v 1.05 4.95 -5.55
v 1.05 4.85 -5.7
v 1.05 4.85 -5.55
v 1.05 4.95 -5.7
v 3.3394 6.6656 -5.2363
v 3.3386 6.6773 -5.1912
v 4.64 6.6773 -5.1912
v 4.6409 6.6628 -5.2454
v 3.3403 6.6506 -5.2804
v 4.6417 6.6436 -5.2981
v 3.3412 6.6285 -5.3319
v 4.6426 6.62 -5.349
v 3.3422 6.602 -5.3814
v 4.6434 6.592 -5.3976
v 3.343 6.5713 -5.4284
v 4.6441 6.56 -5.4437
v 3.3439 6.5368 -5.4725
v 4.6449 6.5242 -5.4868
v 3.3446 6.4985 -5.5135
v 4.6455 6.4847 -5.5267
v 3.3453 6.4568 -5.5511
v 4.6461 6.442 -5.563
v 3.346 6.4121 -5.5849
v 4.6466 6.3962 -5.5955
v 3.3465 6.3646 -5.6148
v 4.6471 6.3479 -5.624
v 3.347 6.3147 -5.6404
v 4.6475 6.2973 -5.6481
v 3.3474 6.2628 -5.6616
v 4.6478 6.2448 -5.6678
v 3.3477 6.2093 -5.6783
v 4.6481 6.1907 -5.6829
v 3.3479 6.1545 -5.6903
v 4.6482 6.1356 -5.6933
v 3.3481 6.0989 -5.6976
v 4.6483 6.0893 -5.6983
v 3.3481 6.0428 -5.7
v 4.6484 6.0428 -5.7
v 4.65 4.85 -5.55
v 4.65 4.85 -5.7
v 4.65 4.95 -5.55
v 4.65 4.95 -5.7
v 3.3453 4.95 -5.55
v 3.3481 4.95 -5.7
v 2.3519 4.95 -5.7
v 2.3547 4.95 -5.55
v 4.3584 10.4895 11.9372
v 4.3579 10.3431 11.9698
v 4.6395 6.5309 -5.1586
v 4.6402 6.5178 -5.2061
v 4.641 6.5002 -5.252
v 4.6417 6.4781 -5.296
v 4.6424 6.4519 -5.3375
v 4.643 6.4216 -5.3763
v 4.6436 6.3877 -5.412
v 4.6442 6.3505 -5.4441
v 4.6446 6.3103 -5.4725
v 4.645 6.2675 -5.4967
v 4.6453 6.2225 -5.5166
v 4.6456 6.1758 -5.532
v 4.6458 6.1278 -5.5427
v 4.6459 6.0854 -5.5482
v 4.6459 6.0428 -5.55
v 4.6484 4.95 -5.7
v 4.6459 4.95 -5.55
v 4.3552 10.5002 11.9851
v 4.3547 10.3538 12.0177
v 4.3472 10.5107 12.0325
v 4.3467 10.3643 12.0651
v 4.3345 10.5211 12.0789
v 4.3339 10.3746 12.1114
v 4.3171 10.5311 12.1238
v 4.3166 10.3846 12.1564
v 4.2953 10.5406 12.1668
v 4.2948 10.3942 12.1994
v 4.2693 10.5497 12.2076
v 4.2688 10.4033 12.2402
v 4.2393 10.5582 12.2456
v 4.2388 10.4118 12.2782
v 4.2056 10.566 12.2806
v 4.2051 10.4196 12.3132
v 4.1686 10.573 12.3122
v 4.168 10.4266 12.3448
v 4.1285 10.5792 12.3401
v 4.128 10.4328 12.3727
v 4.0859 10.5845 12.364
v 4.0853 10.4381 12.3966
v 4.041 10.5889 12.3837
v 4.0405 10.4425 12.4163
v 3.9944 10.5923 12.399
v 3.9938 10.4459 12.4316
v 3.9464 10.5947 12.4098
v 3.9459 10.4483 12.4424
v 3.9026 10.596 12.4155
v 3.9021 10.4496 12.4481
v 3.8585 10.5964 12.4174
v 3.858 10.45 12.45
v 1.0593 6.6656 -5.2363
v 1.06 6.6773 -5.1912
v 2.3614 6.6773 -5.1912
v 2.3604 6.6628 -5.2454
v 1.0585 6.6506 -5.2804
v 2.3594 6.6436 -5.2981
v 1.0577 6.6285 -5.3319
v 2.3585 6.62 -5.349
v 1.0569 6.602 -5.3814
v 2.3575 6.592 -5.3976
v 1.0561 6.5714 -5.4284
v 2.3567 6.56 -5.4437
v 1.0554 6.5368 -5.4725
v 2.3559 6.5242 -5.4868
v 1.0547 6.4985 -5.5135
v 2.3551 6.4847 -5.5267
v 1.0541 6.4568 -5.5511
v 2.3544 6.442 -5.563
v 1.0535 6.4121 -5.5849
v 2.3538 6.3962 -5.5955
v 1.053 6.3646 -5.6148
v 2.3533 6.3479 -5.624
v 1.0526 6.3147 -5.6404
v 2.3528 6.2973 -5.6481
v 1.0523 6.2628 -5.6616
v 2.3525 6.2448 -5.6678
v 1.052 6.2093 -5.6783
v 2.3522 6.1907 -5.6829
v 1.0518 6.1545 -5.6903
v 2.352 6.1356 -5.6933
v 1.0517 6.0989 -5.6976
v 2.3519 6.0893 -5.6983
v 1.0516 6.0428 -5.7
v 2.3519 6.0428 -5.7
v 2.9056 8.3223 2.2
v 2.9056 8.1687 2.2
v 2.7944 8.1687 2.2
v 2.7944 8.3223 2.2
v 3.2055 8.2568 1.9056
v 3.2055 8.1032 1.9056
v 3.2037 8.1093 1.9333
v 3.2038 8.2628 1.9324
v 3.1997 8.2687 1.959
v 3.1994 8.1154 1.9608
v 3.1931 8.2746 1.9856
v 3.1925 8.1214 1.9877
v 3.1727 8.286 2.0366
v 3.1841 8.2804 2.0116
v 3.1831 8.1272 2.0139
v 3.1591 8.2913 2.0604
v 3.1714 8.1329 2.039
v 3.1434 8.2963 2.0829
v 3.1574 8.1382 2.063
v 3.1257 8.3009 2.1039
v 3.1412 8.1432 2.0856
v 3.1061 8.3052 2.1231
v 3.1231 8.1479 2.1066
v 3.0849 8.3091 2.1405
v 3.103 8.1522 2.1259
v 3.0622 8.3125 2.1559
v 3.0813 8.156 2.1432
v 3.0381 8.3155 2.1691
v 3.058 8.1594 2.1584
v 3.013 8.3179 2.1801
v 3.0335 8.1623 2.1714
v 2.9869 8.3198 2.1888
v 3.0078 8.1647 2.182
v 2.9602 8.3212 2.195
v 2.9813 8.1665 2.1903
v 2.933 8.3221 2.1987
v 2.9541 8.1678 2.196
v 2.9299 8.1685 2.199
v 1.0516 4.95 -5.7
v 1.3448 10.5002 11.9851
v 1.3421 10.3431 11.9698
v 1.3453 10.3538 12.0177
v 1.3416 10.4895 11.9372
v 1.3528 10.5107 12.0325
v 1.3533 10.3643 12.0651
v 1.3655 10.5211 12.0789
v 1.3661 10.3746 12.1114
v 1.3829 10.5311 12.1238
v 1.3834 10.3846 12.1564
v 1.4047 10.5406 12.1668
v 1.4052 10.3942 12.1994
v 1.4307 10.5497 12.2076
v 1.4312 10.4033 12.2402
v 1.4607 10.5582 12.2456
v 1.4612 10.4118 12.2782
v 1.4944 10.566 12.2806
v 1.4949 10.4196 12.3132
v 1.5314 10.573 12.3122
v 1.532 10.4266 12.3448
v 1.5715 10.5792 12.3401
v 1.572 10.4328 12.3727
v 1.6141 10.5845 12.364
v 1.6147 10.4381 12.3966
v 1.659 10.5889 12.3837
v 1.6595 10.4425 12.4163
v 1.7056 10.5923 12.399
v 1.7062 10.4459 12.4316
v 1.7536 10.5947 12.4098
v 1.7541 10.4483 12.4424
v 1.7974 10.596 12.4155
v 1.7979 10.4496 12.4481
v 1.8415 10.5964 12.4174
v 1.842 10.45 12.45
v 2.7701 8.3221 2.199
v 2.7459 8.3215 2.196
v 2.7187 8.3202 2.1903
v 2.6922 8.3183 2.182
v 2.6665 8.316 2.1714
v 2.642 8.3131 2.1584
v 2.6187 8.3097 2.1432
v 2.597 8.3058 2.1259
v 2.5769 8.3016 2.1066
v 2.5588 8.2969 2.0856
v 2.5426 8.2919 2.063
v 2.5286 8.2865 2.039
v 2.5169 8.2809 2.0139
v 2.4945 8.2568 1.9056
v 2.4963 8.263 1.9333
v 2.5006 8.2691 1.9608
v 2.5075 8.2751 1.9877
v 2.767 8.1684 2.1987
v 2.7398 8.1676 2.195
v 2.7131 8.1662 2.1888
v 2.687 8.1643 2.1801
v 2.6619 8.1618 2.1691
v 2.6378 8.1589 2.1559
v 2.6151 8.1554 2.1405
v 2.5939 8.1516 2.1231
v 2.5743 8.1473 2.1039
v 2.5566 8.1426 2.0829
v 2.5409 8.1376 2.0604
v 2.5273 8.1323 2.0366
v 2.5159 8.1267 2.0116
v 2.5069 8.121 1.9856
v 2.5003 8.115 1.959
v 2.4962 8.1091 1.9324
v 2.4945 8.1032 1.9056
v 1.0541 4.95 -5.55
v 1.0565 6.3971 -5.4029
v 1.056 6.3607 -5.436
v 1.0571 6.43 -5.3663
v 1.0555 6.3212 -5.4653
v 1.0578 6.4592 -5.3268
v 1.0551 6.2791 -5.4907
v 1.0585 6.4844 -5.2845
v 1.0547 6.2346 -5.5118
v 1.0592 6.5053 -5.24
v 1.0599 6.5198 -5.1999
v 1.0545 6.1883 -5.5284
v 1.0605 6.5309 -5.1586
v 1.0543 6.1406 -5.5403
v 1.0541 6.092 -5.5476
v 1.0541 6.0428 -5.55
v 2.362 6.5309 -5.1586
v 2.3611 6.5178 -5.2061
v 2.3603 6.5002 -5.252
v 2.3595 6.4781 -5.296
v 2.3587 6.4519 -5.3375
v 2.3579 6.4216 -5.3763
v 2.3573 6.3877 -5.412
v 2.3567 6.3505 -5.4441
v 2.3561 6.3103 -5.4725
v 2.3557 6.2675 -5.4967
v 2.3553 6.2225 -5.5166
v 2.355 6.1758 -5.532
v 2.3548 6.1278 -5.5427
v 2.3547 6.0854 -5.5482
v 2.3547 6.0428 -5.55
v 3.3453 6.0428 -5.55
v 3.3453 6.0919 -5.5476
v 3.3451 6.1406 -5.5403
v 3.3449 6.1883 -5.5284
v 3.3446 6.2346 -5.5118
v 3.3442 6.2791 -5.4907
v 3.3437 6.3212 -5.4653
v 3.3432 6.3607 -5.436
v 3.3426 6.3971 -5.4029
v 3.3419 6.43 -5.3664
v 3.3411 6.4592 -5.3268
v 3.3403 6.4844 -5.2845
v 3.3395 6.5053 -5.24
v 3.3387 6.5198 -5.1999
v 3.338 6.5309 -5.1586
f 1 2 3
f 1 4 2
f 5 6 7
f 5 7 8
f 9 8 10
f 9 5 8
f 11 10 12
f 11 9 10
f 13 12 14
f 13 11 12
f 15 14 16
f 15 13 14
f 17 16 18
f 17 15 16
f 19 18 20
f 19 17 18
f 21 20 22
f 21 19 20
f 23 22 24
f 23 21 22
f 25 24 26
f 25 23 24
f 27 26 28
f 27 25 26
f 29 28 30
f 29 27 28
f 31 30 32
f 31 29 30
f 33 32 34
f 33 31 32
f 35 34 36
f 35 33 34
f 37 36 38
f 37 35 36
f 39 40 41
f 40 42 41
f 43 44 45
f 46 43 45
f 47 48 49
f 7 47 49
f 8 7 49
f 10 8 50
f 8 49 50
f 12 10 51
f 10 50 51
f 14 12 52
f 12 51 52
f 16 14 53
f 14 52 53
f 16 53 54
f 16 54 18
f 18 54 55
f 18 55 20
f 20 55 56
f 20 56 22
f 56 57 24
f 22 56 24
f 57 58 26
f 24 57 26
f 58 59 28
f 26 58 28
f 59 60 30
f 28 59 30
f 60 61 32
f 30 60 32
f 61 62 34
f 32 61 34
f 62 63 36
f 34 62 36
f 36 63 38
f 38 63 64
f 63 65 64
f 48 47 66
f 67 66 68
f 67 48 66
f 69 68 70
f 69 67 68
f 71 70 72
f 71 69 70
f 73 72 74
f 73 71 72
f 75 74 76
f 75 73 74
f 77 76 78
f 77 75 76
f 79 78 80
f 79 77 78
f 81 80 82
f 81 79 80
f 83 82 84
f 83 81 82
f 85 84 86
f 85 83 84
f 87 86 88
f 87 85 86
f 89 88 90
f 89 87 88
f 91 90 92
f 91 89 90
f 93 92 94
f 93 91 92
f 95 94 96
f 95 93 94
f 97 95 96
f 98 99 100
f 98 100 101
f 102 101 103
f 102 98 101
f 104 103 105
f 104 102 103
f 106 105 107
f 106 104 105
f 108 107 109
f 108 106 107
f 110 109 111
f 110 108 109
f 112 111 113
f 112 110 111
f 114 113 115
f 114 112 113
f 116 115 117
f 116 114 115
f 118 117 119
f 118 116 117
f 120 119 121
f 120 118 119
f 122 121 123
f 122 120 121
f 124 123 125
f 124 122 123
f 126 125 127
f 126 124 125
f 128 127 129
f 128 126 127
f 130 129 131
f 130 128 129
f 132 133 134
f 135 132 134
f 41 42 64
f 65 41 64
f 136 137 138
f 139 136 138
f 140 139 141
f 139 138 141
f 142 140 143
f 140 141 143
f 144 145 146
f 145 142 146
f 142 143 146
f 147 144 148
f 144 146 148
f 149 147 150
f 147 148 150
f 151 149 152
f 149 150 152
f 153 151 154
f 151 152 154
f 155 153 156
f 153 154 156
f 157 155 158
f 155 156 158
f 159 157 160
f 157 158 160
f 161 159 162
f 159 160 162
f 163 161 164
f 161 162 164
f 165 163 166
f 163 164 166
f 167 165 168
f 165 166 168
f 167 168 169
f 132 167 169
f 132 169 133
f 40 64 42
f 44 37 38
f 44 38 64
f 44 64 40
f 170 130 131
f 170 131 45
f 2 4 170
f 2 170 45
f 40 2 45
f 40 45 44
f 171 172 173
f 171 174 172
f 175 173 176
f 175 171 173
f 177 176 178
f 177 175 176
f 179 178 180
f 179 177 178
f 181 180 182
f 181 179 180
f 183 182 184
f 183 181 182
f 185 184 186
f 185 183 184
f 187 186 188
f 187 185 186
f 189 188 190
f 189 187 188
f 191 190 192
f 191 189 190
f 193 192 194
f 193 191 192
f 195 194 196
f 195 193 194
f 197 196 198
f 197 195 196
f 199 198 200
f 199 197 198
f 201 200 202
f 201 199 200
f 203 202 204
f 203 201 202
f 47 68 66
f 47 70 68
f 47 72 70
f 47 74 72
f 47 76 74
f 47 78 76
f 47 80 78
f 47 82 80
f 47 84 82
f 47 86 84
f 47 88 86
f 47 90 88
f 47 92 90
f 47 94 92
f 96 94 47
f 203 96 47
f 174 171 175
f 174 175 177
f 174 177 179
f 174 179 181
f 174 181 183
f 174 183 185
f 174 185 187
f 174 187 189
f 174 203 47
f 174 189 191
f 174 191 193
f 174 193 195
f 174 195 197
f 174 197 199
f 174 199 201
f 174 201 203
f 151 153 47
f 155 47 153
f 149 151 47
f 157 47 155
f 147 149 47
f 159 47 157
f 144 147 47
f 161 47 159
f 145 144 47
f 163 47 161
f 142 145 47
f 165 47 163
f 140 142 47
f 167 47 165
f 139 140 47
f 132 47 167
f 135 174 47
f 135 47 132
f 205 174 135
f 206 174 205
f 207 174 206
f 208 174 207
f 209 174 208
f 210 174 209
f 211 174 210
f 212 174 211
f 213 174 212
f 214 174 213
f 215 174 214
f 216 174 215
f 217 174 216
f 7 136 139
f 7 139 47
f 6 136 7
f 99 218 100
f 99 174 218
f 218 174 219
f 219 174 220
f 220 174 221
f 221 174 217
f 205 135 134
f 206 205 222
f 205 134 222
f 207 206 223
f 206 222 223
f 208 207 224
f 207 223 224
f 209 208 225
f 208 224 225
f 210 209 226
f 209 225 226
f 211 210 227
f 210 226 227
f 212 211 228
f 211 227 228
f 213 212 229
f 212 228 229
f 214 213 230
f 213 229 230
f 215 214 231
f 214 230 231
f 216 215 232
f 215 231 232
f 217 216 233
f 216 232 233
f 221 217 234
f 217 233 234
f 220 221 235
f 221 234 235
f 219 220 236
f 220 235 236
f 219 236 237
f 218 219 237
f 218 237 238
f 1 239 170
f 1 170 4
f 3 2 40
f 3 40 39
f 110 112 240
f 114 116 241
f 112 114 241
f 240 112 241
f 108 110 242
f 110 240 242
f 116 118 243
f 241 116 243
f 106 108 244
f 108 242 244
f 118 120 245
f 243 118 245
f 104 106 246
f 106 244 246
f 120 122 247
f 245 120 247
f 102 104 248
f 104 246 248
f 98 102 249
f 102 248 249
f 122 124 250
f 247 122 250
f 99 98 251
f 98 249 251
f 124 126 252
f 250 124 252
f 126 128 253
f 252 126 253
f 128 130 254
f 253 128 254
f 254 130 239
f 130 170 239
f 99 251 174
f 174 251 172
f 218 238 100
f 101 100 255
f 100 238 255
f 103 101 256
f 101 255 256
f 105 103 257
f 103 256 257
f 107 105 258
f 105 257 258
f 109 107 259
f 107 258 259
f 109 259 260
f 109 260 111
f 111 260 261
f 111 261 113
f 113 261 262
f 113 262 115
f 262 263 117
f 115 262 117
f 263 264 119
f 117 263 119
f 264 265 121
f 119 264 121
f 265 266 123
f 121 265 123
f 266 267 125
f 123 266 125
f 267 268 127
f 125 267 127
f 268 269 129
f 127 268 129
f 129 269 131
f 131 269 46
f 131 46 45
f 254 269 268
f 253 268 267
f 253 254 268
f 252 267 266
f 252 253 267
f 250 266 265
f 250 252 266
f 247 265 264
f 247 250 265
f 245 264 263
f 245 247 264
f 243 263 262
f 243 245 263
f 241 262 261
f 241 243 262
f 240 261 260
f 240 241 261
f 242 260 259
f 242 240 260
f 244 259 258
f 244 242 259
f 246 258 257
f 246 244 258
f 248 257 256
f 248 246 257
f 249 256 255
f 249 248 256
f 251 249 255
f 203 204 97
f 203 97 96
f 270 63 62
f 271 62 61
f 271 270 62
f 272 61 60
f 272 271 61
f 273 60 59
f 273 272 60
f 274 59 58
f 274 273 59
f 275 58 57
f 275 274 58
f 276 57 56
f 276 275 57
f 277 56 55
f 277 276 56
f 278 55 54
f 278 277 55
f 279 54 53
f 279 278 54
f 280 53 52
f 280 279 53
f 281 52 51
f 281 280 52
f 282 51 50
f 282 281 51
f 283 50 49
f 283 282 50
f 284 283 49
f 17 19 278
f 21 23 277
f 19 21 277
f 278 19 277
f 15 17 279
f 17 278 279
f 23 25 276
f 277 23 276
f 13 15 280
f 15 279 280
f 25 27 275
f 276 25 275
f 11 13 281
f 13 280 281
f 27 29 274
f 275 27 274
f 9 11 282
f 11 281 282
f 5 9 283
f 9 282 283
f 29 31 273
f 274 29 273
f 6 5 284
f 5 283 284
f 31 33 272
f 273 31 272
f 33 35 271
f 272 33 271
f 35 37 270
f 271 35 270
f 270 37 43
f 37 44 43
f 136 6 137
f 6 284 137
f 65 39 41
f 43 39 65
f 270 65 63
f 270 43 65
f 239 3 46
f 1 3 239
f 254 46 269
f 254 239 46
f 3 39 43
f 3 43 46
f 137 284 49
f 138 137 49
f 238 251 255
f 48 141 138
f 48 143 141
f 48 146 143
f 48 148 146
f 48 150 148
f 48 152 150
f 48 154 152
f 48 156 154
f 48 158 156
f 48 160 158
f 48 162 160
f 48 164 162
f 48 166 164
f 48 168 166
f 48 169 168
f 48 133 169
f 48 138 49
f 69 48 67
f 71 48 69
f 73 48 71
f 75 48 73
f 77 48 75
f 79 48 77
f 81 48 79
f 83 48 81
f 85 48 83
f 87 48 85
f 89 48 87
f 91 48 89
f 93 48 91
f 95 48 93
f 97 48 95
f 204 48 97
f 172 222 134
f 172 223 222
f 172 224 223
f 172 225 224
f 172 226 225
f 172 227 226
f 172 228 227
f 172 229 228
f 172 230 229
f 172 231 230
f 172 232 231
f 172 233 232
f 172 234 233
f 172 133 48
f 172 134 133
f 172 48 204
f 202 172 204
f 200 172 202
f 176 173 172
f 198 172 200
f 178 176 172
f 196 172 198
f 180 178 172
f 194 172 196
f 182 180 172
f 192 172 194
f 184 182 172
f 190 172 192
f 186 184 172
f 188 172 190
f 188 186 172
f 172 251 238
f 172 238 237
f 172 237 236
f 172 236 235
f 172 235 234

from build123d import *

# Parameters (mm, degrees)
LEVER_DEPTH      = 1.8
LEVER_DEPTH_BACK = 1.8
CUT_DEPTH        = 15.439772455
FILLET_1_R       = 0.5


with BuildPart() as part:
    # Эскиз1 → Lever (new, two sides: drawn at the far end of the back side and taken through both)
    with BuildSketch(Plane(origin=(2.85, 0, 0), x_dir=(0, 0, -1), z_dir=(1, 0, 0)).offset(-LEVER_DEPTH_BACK)):
        with BuildLine():
            Line((5.55, 4.85), (5.55, 6.042820323))
            ThreePointArc((5.55, 6.042820323), (5.440072487, 6.355619708), (5.158626179, 6.530878059))
            Line((5.158626179, 6.530878059), (-12.45, 10.45))
            Line((-12.45, 10.45), (-12.417412146, 10.596417321))
            Line((-12.417412146, 10.596417321), (5.191214033, 6.677295379))
            ThreePointArc((5.191214033, 6.677295379), (5.557094233, 6.449459523), (5.7, 6.042820323))
            Line((5.7, 6.042820323), (5.7, 4.85))
            Line((5.7, 4.85), (5.55, 4.85))
        make_face()
    extrude(amount=LEVER_DEPTH + LEVER_DEPTH_BACK)

    # Эскиз2 → Cut (cut, through all)
    with BuildSketch(Plane(origin=(0, 4.95, 0), x_dir=(1, 0, 0), z_dir=(0, 1, 0))):
        Polygon((1.05, 5.8), (1.35, -12.45), (1.05, -12.45), align=None)
        Polygon((4.65, 5.8), (4.65, -12.45), (4.35, -12.45), align=None)
        with BuildLine():
            Line((2.35, 5.8), (3.35, 5.8))
            Line((3.35, 5.8), (3.20551955, -1.905624011))
            ThreePointArc((3.20551955, -1.905624011), (3.115706509, -2.11411119), (2.90557227, -2.2))
            Line((2.90557227, -2.2), (2.79442773, -2.2))
            ThreePointArc((2.79442773, -2.2), (2.584293491, -2.11411119), (2.49448045, -1.905624011))
            Line((2.49448045, -1.905624011), (2.35, 5.8))
        make_face()
    extrude(amount=CUT_DEPTH, mode=Mode.SUBTRACT)

    # Скругление1
    fillet_1_edges = [part.edges().sort_by_distance(p)[0] for p in [
        (4.350267845, 10.52320866, 12.433706073),
        (1.349732155, 10.52320866, 12.433706073),
    ]]
    fillet(fillet_1_edges, radius=FILLET_1_R)


solid = part.part
